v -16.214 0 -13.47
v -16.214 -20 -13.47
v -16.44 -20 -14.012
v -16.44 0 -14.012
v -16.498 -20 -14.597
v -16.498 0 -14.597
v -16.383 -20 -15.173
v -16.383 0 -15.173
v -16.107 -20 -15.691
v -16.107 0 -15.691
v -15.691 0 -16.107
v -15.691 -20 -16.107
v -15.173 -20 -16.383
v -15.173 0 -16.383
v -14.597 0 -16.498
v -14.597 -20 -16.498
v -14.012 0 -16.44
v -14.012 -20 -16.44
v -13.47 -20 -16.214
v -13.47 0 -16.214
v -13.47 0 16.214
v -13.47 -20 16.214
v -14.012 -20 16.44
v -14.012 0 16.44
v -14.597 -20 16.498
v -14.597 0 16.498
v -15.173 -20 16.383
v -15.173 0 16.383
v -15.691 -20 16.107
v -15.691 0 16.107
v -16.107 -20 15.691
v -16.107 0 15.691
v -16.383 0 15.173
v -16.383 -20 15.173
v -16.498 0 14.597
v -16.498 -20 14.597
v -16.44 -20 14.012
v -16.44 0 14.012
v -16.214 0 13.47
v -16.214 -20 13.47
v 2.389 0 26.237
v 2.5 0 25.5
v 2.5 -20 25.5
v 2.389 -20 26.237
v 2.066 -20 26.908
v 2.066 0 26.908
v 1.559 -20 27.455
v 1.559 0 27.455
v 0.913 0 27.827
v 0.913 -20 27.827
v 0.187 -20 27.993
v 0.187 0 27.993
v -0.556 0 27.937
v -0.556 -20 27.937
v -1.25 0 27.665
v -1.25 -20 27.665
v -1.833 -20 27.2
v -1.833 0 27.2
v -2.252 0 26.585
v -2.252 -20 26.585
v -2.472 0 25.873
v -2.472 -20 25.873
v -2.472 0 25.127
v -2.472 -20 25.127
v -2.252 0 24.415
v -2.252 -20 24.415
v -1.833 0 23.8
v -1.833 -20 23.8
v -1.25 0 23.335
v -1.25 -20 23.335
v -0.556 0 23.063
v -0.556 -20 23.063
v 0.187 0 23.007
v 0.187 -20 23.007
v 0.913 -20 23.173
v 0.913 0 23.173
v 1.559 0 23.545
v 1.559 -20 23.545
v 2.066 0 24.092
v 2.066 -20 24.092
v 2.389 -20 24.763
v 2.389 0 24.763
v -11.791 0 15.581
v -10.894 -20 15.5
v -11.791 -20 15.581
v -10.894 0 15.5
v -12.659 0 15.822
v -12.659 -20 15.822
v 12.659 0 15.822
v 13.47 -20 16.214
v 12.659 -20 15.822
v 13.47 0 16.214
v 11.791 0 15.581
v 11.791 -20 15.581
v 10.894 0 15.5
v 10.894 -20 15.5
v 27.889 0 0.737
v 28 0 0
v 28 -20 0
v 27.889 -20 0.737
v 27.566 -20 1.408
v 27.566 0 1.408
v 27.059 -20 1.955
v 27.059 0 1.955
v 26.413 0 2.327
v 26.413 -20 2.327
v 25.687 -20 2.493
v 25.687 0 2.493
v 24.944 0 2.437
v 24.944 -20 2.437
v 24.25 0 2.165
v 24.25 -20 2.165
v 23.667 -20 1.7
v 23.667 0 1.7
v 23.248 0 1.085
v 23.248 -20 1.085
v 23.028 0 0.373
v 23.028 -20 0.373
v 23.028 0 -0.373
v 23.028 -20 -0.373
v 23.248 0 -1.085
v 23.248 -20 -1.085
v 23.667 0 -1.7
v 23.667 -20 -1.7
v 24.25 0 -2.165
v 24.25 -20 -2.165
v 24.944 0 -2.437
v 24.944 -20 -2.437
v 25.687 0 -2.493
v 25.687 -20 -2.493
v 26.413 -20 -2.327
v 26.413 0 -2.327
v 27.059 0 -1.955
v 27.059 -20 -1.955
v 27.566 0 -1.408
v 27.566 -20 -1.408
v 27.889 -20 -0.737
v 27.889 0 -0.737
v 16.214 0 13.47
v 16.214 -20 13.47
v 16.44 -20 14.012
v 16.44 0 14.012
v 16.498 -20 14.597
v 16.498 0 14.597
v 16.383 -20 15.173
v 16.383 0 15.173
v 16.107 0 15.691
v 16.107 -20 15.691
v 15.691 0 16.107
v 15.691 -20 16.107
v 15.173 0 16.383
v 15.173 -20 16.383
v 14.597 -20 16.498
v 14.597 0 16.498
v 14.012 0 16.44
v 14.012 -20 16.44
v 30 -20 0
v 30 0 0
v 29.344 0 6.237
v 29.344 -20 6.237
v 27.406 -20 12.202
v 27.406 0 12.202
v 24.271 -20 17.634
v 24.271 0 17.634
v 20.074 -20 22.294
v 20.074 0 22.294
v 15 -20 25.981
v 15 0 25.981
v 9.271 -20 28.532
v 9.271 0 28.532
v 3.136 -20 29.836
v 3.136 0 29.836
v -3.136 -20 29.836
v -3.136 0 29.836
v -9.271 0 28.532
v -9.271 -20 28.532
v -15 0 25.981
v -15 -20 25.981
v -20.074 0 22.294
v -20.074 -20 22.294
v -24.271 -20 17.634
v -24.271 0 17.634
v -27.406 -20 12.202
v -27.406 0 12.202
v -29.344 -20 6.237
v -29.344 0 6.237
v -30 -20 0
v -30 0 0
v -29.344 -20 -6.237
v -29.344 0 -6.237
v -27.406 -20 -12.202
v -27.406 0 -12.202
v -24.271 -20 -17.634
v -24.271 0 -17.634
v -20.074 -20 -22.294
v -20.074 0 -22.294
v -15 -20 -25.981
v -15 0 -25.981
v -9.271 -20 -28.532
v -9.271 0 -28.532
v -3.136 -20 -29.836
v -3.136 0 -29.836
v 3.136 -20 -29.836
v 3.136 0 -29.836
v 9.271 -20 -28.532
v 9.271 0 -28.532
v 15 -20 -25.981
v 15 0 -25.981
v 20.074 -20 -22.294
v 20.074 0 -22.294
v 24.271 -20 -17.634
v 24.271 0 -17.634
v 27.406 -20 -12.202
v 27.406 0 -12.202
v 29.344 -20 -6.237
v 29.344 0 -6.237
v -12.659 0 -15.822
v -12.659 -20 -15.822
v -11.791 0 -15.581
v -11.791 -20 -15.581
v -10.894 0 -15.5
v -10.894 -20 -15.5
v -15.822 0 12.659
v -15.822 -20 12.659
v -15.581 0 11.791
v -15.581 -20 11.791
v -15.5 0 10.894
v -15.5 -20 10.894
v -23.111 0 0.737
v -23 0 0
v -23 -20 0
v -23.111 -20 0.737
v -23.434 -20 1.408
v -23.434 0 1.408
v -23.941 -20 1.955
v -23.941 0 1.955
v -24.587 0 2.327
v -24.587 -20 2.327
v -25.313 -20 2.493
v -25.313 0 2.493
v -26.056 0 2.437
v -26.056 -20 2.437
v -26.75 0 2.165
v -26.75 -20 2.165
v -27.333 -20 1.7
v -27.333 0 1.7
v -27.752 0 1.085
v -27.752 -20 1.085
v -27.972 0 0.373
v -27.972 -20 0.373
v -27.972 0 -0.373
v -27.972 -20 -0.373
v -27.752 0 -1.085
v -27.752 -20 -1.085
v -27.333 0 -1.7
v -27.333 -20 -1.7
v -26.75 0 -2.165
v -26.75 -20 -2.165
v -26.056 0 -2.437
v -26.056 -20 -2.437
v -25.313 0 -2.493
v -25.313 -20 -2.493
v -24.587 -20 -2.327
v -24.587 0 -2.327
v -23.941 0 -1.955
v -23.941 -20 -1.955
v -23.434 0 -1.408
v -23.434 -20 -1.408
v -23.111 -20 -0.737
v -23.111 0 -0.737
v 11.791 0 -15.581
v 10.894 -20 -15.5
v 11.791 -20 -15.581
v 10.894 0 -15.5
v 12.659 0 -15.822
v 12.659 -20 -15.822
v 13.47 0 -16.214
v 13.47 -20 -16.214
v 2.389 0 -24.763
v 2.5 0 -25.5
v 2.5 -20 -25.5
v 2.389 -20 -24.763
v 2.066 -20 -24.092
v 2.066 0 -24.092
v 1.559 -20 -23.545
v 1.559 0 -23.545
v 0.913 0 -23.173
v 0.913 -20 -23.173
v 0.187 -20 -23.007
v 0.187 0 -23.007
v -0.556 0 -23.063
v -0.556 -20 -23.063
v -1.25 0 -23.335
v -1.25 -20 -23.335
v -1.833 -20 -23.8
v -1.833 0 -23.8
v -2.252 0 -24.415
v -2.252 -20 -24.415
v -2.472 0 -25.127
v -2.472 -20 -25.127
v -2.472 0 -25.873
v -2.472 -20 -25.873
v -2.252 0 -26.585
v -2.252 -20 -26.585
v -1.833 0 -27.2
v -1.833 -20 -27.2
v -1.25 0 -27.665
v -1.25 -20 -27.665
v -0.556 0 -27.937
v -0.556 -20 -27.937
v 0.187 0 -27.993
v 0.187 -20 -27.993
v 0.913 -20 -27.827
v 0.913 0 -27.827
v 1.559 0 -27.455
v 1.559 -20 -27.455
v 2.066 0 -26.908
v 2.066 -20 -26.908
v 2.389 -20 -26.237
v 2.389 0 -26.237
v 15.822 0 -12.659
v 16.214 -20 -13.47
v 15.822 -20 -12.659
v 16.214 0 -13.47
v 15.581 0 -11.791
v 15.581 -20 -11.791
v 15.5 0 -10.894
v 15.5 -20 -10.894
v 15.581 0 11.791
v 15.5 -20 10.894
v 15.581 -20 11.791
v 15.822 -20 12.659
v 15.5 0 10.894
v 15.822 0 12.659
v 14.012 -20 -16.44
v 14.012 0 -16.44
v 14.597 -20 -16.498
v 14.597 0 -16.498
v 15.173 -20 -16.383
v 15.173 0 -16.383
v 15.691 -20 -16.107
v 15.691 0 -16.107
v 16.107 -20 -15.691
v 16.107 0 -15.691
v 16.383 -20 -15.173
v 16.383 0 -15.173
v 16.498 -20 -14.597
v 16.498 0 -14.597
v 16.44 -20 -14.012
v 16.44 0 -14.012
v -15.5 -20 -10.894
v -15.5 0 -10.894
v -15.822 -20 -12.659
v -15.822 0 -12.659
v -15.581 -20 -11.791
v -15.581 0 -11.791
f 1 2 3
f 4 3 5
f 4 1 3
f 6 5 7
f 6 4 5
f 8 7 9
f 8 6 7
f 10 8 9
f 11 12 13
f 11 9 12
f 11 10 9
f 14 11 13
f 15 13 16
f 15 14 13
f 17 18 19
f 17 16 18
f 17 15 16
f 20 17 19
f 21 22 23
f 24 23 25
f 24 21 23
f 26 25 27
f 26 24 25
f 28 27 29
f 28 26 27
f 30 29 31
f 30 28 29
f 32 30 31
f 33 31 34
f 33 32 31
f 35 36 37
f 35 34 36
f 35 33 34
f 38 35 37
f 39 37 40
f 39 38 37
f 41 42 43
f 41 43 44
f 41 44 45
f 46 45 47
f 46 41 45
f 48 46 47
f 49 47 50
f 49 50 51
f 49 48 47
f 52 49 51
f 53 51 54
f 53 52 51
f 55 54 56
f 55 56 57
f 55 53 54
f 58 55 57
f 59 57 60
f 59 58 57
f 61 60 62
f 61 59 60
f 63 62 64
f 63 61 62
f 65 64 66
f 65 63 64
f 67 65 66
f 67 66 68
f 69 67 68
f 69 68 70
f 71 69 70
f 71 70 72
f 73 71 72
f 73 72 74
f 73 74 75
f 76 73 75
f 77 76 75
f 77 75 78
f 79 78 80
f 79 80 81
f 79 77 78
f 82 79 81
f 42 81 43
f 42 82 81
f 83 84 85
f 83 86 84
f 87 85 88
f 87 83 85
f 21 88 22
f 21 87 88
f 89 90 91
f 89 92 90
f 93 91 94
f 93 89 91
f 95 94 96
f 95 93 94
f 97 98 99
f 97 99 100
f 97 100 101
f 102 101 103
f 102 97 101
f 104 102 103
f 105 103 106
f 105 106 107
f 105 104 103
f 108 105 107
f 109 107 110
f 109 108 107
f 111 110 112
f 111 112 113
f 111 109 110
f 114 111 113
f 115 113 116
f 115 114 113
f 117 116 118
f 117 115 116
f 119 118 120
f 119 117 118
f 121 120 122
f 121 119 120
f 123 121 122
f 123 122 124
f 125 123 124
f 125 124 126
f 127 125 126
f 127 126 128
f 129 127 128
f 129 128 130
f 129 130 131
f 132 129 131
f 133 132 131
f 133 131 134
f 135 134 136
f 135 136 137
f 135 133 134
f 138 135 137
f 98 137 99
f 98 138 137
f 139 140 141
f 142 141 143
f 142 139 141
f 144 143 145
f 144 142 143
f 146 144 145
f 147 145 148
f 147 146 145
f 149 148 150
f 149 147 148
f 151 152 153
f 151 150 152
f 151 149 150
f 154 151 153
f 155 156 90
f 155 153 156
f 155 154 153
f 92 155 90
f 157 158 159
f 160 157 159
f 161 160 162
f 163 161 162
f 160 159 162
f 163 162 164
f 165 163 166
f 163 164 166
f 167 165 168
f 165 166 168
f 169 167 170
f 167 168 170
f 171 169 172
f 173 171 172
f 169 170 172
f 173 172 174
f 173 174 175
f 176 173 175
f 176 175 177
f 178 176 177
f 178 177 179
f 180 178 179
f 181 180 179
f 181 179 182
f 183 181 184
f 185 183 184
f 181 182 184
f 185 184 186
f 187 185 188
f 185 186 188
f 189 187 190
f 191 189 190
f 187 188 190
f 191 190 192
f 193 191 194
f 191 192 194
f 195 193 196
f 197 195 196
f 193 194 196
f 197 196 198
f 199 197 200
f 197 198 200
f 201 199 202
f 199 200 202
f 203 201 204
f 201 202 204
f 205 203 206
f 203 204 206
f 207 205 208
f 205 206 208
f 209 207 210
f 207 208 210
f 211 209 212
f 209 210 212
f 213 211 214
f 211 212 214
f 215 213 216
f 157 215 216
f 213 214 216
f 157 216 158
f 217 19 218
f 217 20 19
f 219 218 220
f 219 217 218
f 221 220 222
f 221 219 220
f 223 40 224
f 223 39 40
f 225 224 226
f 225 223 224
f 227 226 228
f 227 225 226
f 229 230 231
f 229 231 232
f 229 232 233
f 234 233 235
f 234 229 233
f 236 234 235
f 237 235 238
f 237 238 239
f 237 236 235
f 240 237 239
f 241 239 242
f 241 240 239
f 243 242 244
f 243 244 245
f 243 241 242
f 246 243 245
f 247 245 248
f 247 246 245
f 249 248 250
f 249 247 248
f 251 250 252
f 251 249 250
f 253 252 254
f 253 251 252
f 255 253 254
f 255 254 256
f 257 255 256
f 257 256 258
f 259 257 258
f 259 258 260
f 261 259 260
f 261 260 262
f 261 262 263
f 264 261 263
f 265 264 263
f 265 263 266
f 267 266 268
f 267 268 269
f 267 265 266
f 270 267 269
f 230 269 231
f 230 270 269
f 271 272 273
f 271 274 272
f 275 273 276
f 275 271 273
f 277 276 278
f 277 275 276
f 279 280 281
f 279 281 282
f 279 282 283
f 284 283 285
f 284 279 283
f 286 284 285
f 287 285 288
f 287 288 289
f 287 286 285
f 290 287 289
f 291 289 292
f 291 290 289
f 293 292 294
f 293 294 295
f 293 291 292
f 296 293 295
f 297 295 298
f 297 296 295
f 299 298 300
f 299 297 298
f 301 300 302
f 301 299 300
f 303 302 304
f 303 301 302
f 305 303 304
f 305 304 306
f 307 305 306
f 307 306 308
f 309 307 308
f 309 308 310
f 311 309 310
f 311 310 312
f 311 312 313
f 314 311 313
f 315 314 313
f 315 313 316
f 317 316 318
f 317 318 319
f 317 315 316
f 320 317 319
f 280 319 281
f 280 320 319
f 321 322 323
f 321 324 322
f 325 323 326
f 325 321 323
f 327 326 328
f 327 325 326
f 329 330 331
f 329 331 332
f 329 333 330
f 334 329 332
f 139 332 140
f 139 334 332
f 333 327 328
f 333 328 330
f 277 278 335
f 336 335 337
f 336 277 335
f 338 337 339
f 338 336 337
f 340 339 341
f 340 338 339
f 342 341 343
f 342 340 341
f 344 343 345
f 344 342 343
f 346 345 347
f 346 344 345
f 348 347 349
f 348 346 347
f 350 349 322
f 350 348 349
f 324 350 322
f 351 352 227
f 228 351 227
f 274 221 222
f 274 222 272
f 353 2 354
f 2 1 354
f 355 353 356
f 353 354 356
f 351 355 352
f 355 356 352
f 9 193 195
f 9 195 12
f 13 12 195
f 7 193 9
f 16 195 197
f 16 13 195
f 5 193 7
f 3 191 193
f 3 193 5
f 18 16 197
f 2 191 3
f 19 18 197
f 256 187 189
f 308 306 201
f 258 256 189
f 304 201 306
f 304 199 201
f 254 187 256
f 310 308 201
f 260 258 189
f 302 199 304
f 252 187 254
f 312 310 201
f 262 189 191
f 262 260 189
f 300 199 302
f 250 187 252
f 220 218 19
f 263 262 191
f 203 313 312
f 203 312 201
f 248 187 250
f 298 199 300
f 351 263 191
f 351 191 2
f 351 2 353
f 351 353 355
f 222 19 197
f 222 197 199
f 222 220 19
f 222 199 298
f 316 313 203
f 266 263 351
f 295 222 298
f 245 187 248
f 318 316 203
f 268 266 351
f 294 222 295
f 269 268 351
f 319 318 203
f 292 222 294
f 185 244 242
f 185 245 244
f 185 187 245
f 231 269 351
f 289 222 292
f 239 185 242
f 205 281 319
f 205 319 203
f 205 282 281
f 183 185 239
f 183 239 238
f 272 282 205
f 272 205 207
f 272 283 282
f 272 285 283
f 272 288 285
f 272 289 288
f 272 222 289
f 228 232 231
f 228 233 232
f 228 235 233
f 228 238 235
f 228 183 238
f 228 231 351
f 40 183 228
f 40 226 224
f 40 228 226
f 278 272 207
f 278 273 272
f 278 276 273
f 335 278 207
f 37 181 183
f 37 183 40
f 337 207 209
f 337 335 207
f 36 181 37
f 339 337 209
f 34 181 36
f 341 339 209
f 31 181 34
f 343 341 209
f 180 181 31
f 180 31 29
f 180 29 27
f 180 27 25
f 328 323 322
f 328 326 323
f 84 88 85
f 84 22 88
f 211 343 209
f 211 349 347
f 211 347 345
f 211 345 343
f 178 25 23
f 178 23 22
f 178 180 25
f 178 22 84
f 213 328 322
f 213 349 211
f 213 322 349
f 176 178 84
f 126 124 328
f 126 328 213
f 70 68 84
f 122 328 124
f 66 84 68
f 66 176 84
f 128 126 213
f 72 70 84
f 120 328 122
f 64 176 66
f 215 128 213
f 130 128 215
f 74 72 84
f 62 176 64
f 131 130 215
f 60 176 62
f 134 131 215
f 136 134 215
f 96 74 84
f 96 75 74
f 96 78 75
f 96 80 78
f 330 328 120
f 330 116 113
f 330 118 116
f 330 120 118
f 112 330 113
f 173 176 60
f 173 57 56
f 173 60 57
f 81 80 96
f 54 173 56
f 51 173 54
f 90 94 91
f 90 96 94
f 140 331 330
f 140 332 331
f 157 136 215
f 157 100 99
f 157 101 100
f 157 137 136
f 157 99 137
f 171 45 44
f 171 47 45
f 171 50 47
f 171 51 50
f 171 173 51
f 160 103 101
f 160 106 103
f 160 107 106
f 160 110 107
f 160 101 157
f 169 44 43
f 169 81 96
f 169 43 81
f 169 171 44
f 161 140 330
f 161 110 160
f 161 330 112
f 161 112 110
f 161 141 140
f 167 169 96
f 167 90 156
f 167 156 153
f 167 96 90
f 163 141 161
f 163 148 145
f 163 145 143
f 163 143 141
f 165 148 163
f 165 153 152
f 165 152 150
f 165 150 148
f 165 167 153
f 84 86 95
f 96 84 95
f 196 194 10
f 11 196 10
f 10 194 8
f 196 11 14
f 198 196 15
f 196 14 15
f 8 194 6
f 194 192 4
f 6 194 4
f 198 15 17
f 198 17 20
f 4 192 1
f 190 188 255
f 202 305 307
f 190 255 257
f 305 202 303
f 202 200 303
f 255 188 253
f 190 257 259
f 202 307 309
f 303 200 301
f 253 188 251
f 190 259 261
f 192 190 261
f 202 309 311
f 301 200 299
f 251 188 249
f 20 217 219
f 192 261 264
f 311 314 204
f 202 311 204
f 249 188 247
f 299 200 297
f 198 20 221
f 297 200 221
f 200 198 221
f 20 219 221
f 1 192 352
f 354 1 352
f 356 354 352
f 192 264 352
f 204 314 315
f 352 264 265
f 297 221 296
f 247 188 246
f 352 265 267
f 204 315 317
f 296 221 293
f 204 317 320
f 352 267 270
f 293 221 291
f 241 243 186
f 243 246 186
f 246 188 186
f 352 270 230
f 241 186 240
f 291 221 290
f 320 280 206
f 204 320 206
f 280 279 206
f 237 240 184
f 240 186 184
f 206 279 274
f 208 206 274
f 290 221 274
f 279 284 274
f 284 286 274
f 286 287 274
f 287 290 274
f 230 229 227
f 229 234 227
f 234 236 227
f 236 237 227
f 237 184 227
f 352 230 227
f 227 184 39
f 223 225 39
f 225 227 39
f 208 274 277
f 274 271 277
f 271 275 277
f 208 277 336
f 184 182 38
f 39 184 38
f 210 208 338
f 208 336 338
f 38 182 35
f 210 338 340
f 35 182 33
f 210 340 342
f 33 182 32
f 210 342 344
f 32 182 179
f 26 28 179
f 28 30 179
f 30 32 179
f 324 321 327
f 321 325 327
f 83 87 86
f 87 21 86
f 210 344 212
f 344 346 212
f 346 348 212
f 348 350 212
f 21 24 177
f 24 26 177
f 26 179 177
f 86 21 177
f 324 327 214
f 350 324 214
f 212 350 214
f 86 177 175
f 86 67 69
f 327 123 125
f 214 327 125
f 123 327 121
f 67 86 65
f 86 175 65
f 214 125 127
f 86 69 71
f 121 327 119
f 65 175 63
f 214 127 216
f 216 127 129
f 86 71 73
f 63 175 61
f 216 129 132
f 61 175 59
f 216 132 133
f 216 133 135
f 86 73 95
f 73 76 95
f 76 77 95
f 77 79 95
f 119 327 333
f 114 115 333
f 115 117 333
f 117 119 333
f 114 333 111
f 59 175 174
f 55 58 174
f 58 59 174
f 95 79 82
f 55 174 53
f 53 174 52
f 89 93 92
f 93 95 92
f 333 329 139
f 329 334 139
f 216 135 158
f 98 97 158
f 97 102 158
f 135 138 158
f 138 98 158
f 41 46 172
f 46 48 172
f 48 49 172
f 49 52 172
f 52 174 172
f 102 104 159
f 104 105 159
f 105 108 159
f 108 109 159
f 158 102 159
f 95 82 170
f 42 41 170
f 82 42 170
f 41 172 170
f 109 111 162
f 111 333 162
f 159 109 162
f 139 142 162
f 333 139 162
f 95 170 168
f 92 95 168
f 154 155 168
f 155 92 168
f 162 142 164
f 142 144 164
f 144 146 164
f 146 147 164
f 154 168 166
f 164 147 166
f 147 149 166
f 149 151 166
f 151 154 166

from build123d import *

# Parameters (mm, degrees)
F0_R     = 30
F0_R_2   = 2.5
F1_DEPTH = 20
F2_W     = 31
F2_H     = 31
F3_DEPTH = 20.001
F4_R     = 2
F5_DEPTH = 20.001
F6_R     = 5


with BuildPart() as f1:
    # F0 (on Front) → F1 (new body)
    with BuildSketch(Plane.XZ):
        Circle(F0_R)
        with Locations((0, -25.5)):
            Circle(F0_R_2, mode=Mode.SUBTRACT)
        with Locations((-25.5, 0)):
            Circle(F0_R_2, mode=Mode.SUBTRACT)
        with Locations((25.5, 0)):
            Circle(F0_R_2, mode=Mode.SUBTRACT)
        with Locations((0, 25.5)):
            Circle(F0_R_2, mode=Mode.SUBTRACT)
    extrude(amount=F1_DEPTH)

    # F2 (on Front) → F3 (cut, through all)
    with BuildSketch(Plane.XZ):
        Rectangle(F2_W, F2_H)
    extrude(amount=F3_DEPTH, mode=Mode.SUBTRACT)

    # F4 (on Front) → F5 (cut, through all)
    with BuildSketch(Plane.XZ):
        with Locations((-14.5, 14.5)):
            Circle(F4_R)
        with Locations((14.5, 14.5)):
            Circle(F4_R)
        with Locations((14.5, -14.5)):
            Circle(F4_R)
        with Locations((-14.5, -14.5)):
            Circle(F4_R)
    extrude(amount=F5_DEPTH, mode=Mode.SUBTRACT)

    # F6
    f6_edges = [f1.edges().sort_by_distance(p)[0] for p in [
        (-12.767949, -10, 15.5),
        (-15.5, -10, 12.767949),
        (-15.5, -10, -12.767949),
        (-12.767949, -10, -15.5),
        (12.767949, -10, -15.5),
        (15.5, -10, -12.767949),
        (15.5, -10, 12.767949),
        (12.767949, -10, 15.5),
    ]]
    fillet(f6_edges, radius=F6_R)


solid = f1.part
